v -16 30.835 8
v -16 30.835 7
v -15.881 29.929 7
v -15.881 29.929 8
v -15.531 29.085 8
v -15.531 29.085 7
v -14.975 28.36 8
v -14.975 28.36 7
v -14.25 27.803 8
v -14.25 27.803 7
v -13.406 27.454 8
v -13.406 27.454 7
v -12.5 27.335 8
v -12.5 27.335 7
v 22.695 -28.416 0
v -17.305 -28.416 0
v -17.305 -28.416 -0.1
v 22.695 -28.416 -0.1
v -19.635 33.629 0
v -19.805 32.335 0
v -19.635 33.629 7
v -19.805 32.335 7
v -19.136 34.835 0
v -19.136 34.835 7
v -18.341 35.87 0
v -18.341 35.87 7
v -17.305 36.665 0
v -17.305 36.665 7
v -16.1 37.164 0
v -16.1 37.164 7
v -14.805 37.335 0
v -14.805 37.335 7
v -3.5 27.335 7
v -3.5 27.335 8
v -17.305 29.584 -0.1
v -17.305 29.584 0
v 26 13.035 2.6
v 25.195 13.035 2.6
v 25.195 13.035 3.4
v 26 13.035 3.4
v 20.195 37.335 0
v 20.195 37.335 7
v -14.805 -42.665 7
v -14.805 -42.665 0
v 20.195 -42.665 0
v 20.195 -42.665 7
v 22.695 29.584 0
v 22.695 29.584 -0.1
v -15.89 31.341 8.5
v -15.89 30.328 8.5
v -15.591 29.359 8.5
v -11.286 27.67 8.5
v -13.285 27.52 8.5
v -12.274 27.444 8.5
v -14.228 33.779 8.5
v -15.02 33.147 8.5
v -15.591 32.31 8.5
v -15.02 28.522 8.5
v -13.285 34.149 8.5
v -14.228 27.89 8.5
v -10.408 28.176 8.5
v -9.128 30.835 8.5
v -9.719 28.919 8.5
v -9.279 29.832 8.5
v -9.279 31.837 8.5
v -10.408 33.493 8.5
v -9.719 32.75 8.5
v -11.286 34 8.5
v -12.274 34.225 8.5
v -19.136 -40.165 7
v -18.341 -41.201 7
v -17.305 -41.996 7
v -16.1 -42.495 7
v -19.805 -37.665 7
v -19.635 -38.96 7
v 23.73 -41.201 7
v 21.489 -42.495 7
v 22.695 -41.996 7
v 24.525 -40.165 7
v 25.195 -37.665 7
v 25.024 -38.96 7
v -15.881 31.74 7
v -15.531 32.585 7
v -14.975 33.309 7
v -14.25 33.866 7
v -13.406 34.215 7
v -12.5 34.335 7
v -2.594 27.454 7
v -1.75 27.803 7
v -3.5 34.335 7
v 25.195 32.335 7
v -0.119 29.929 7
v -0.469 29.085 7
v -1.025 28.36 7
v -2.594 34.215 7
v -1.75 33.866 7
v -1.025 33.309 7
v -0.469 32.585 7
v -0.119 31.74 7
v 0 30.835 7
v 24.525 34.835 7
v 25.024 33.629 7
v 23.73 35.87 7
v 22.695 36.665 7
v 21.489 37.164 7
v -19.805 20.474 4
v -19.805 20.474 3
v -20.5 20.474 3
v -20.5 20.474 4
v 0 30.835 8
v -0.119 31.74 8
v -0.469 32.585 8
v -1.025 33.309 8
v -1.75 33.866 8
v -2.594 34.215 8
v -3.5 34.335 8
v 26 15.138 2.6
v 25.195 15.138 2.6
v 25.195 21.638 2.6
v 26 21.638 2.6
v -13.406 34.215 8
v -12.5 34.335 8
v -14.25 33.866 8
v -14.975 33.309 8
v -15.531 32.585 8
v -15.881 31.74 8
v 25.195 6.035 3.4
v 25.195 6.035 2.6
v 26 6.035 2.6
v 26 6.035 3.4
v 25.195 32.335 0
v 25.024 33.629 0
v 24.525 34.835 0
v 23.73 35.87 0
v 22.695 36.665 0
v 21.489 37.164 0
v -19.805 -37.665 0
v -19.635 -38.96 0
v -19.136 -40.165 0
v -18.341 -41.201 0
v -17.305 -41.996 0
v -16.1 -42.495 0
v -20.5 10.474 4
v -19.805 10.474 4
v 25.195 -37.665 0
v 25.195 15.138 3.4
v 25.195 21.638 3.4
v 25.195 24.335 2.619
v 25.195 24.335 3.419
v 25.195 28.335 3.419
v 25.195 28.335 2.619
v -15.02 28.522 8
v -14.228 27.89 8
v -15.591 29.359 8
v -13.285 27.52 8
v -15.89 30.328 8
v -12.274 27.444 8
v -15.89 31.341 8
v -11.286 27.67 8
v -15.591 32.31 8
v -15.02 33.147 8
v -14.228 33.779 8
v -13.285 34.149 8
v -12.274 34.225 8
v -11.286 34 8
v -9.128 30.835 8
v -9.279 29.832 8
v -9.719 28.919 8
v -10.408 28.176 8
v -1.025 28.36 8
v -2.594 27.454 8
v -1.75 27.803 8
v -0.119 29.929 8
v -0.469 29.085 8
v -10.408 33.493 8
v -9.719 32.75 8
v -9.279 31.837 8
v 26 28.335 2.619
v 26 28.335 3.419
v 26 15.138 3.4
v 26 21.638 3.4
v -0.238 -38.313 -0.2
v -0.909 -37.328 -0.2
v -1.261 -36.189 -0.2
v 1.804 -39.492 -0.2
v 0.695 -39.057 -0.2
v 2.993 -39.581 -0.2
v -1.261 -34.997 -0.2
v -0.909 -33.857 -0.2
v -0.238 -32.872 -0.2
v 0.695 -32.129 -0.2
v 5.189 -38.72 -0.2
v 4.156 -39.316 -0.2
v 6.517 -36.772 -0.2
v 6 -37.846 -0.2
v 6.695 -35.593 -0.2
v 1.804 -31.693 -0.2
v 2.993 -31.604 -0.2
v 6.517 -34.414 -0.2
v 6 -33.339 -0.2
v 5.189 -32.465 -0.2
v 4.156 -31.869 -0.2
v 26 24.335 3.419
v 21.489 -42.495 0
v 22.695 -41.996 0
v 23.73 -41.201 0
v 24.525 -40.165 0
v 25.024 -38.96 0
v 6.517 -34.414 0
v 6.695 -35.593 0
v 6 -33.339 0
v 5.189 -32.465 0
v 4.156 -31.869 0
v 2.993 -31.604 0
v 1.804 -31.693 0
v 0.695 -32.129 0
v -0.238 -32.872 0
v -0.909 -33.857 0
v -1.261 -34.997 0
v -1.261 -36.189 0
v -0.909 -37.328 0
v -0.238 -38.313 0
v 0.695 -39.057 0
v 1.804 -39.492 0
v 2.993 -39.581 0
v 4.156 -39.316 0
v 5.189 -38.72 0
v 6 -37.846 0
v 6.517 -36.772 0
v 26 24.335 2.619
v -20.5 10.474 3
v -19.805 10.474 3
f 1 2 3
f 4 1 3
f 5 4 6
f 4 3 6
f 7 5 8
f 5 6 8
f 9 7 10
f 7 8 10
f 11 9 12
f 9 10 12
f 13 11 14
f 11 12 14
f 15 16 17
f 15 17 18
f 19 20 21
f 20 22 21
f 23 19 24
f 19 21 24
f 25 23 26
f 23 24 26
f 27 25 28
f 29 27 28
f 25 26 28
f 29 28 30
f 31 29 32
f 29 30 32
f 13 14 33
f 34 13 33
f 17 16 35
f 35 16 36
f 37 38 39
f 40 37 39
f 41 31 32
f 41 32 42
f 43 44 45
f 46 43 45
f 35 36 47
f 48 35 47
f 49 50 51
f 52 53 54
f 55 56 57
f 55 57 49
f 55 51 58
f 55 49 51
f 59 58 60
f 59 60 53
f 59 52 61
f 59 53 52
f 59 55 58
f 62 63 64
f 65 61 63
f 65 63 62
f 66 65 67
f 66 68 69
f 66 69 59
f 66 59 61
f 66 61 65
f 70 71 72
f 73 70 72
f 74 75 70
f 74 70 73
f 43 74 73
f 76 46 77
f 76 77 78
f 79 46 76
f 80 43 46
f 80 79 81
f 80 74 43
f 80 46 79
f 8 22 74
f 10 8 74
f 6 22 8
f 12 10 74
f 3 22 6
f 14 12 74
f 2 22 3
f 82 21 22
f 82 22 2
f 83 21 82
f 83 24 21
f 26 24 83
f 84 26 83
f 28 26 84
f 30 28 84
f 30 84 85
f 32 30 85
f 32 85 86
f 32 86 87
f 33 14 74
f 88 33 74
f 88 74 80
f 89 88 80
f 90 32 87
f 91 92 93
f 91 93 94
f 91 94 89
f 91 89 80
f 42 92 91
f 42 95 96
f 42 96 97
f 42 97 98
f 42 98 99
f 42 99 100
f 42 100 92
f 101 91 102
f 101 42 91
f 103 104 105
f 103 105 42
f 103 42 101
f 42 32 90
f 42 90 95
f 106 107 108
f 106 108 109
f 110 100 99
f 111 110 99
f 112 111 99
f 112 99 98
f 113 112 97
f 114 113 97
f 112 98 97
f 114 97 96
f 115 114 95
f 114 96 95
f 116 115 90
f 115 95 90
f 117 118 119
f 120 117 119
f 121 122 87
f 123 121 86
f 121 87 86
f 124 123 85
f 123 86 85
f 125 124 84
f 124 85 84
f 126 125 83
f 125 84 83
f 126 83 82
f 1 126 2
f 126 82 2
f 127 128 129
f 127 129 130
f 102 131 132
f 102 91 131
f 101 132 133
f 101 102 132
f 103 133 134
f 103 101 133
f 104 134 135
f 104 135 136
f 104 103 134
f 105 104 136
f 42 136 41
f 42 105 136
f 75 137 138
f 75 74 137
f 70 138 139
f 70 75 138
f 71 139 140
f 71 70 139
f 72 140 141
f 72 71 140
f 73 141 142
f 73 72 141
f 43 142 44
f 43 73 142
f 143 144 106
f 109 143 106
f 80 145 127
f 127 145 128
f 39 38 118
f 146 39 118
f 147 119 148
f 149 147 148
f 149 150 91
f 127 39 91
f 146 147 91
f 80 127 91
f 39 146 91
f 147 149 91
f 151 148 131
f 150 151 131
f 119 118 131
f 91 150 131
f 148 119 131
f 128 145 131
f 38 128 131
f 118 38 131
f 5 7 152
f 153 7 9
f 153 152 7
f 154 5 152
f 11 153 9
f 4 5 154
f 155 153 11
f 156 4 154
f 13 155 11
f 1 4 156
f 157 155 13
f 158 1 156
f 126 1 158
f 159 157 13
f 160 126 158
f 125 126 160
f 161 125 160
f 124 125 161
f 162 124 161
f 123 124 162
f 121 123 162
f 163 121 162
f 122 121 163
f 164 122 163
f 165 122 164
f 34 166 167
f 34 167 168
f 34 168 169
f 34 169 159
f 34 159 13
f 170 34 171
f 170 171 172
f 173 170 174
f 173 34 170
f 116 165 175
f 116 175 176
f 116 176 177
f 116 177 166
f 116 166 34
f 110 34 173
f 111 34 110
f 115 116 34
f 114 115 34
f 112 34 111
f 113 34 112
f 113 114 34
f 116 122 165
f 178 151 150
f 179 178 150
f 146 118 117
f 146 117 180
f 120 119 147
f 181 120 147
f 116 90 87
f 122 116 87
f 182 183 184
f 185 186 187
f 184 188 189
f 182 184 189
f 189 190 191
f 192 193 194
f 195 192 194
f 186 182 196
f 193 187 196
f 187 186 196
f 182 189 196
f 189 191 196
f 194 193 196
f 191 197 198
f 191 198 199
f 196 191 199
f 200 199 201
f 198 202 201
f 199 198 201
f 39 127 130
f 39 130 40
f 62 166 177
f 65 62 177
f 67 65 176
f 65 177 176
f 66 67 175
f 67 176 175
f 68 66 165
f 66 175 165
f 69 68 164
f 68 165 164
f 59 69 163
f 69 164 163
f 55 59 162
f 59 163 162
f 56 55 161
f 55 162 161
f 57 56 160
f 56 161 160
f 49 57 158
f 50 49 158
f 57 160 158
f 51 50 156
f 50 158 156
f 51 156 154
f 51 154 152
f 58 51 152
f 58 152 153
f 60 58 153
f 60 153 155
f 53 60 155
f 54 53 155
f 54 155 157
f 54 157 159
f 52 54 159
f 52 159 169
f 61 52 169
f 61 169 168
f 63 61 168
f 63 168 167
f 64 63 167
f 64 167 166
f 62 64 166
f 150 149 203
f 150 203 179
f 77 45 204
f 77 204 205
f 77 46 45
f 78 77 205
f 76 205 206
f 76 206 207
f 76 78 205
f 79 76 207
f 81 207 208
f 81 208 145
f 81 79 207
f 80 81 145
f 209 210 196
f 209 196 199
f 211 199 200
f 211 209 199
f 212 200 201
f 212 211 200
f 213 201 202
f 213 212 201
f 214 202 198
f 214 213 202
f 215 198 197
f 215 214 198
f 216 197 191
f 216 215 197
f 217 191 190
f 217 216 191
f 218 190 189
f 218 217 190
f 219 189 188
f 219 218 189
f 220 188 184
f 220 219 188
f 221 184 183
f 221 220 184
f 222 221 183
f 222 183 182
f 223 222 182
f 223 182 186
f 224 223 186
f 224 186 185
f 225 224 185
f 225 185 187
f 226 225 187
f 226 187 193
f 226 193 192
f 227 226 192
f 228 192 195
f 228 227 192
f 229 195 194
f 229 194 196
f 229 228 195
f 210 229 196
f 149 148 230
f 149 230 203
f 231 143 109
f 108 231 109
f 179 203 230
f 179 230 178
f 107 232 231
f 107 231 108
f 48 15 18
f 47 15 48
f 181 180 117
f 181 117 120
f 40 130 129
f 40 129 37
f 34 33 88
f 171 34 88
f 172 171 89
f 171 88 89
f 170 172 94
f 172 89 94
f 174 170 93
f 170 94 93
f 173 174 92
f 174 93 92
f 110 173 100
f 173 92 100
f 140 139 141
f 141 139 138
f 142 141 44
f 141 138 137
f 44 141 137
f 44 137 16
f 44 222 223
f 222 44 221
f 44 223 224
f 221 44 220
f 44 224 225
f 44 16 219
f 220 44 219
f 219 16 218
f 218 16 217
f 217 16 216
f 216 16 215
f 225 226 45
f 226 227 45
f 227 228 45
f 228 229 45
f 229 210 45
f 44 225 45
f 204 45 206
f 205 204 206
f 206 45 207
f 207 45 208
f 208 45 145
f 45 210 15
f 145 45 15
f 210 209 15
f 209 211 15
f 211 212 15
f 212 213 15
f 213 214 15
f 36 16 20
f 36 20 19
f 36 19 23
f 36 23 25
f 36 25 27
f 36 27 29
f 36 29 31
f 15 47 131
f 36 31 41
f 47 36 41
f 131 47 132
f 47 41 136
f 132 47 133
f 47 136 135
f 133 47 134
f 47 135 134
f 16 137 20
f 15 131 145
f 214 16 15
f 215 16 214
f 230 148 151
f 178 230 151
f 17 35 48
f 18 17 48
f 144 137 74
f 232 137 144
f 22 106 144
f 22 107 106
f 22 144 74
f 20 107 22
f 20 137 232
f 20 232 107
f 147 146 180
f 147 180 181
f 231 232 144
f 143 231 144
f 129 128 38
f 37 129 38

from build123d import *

# Parameters (mm, degrees)
F0_W      = 45
F0_H      = 80
F1_DEPTH  = 7
F2_R      = 5
F4_DEPTH  = 8
F5_R      = 3.4
F6_DEPTH  = 8.5
F7_W      = 4
F7_H      = 0.8
F8_DEPTH  = 26
F9_W      = 6.5
F9_H      = 0.8
F10_DEPTH = 26
F11_W     = 7
F11_H     = 0.8
F12_DEPTH = 26
F13_W     = 10
F13_H     = 1
F14_DEPTH = 20.5
F15_R     = 4
F16_DEPTH = 0.2
F17_W     = 40
F17_H     = 58
F18_DEPTH = 0.1


with BuildPart() as f1:
    # F0 (on Top) → F1 (new body)
    with BuildSketch(Plane.XY):
        with Locations((2.694569, -2.665429)):
            Rectangle(F0_W, F0_H)
    extrude(amount=F1_DEPTH)

    # F2
    f2_edges = [f1.edges().sort_by_distance(p)[0] for p in [
        (-19.805431, 37.334571, 3.5),
        (25.194569, 37.334571, 3.5),
        (-19.805431, -42.665429, 3.5),
        (25.194569, -42.665429, 3.5),
    ]]
    fillet(f2_edges, radius=F2_R)

    # F3 (on Top) → F4 (join)
    with BuildSketch(Plane.XY):
        with BuildLine():
            Line((-3.5, 34.334571), (-12.5, 34.334571))
            ThreePointArc((-12.5, 34.334571), (-14.974874, 33.309444), (-16, 30.834571))
            ThreePointArc((-16, 30.834571), (-14.974874, 28.359697), (-12.5, 27.334571))
            Line((-12.5, 27.334571), (-3.5, 27.334571))
            ThreePointArc((-3.5, 27.334571), (-1.025126, 28.359697), (0, 30.834571))
            ThreePointArc((0, 30.834571), (-1.025126, 33.309444), (-3.5, 34.334571))
        make_face()
    extrude(amount=F4_DEPTH)

    # F5 (on Top) → F6 (join)
    with BuildSketch(Plane.XY):
        with Locations((-12.527948, 30.834571)):
            Circle(F5_R)
    extrude(amount=F6_DEPTH)

    # F7 (on Right) → F8 (join)
    with BuildSketch(Plane.YZ):
        with Locations((26.334571, 3.018534)):
            Rectangle(F7_W, F7_H)
    extrude(amount=F8_DEPTH)

    # F9 (on Right) → F10 (join)
    with BuildSketch(Plane.YZ):
        with Locations((18.387751, 3)):
            Rectangle(F9_W, F9_H)
    extrude(amount=F10_DEPTH)

    # F11 (on Right) → F12 (join)
    with BuildSketch(Plane.YZ):
        with Locations((9.535096, 3)):
            Rectangle(F11_W, F11_H)
    extrude(amount=F12_DEPTH)

    # F13 (on Right) → F14 (join)
    with BuildSketch(Plane.YZ):
        with Locations((15.474138, 3.5)):
            Rectangle(F13_W, F13_H)
    extrude(amount=-F14_DEPTH)

    # F15 (on Top) → F16 (join)
    with BuildSketch(Plane.XY):
        with Locations((2.694569, -35.592675)):
            Circle(F15_R)
    extrude(amount=-F16_DEPTH)

    # F17 (on Top) → F18 (join)
    with BuildSketch(Plane.XY):
        with Locations((2.694569, 0.584052)):
            Rectangle(F17_W, F17_H)
    extrude(amount=-F18_DEPTH)


solid = f1.part
